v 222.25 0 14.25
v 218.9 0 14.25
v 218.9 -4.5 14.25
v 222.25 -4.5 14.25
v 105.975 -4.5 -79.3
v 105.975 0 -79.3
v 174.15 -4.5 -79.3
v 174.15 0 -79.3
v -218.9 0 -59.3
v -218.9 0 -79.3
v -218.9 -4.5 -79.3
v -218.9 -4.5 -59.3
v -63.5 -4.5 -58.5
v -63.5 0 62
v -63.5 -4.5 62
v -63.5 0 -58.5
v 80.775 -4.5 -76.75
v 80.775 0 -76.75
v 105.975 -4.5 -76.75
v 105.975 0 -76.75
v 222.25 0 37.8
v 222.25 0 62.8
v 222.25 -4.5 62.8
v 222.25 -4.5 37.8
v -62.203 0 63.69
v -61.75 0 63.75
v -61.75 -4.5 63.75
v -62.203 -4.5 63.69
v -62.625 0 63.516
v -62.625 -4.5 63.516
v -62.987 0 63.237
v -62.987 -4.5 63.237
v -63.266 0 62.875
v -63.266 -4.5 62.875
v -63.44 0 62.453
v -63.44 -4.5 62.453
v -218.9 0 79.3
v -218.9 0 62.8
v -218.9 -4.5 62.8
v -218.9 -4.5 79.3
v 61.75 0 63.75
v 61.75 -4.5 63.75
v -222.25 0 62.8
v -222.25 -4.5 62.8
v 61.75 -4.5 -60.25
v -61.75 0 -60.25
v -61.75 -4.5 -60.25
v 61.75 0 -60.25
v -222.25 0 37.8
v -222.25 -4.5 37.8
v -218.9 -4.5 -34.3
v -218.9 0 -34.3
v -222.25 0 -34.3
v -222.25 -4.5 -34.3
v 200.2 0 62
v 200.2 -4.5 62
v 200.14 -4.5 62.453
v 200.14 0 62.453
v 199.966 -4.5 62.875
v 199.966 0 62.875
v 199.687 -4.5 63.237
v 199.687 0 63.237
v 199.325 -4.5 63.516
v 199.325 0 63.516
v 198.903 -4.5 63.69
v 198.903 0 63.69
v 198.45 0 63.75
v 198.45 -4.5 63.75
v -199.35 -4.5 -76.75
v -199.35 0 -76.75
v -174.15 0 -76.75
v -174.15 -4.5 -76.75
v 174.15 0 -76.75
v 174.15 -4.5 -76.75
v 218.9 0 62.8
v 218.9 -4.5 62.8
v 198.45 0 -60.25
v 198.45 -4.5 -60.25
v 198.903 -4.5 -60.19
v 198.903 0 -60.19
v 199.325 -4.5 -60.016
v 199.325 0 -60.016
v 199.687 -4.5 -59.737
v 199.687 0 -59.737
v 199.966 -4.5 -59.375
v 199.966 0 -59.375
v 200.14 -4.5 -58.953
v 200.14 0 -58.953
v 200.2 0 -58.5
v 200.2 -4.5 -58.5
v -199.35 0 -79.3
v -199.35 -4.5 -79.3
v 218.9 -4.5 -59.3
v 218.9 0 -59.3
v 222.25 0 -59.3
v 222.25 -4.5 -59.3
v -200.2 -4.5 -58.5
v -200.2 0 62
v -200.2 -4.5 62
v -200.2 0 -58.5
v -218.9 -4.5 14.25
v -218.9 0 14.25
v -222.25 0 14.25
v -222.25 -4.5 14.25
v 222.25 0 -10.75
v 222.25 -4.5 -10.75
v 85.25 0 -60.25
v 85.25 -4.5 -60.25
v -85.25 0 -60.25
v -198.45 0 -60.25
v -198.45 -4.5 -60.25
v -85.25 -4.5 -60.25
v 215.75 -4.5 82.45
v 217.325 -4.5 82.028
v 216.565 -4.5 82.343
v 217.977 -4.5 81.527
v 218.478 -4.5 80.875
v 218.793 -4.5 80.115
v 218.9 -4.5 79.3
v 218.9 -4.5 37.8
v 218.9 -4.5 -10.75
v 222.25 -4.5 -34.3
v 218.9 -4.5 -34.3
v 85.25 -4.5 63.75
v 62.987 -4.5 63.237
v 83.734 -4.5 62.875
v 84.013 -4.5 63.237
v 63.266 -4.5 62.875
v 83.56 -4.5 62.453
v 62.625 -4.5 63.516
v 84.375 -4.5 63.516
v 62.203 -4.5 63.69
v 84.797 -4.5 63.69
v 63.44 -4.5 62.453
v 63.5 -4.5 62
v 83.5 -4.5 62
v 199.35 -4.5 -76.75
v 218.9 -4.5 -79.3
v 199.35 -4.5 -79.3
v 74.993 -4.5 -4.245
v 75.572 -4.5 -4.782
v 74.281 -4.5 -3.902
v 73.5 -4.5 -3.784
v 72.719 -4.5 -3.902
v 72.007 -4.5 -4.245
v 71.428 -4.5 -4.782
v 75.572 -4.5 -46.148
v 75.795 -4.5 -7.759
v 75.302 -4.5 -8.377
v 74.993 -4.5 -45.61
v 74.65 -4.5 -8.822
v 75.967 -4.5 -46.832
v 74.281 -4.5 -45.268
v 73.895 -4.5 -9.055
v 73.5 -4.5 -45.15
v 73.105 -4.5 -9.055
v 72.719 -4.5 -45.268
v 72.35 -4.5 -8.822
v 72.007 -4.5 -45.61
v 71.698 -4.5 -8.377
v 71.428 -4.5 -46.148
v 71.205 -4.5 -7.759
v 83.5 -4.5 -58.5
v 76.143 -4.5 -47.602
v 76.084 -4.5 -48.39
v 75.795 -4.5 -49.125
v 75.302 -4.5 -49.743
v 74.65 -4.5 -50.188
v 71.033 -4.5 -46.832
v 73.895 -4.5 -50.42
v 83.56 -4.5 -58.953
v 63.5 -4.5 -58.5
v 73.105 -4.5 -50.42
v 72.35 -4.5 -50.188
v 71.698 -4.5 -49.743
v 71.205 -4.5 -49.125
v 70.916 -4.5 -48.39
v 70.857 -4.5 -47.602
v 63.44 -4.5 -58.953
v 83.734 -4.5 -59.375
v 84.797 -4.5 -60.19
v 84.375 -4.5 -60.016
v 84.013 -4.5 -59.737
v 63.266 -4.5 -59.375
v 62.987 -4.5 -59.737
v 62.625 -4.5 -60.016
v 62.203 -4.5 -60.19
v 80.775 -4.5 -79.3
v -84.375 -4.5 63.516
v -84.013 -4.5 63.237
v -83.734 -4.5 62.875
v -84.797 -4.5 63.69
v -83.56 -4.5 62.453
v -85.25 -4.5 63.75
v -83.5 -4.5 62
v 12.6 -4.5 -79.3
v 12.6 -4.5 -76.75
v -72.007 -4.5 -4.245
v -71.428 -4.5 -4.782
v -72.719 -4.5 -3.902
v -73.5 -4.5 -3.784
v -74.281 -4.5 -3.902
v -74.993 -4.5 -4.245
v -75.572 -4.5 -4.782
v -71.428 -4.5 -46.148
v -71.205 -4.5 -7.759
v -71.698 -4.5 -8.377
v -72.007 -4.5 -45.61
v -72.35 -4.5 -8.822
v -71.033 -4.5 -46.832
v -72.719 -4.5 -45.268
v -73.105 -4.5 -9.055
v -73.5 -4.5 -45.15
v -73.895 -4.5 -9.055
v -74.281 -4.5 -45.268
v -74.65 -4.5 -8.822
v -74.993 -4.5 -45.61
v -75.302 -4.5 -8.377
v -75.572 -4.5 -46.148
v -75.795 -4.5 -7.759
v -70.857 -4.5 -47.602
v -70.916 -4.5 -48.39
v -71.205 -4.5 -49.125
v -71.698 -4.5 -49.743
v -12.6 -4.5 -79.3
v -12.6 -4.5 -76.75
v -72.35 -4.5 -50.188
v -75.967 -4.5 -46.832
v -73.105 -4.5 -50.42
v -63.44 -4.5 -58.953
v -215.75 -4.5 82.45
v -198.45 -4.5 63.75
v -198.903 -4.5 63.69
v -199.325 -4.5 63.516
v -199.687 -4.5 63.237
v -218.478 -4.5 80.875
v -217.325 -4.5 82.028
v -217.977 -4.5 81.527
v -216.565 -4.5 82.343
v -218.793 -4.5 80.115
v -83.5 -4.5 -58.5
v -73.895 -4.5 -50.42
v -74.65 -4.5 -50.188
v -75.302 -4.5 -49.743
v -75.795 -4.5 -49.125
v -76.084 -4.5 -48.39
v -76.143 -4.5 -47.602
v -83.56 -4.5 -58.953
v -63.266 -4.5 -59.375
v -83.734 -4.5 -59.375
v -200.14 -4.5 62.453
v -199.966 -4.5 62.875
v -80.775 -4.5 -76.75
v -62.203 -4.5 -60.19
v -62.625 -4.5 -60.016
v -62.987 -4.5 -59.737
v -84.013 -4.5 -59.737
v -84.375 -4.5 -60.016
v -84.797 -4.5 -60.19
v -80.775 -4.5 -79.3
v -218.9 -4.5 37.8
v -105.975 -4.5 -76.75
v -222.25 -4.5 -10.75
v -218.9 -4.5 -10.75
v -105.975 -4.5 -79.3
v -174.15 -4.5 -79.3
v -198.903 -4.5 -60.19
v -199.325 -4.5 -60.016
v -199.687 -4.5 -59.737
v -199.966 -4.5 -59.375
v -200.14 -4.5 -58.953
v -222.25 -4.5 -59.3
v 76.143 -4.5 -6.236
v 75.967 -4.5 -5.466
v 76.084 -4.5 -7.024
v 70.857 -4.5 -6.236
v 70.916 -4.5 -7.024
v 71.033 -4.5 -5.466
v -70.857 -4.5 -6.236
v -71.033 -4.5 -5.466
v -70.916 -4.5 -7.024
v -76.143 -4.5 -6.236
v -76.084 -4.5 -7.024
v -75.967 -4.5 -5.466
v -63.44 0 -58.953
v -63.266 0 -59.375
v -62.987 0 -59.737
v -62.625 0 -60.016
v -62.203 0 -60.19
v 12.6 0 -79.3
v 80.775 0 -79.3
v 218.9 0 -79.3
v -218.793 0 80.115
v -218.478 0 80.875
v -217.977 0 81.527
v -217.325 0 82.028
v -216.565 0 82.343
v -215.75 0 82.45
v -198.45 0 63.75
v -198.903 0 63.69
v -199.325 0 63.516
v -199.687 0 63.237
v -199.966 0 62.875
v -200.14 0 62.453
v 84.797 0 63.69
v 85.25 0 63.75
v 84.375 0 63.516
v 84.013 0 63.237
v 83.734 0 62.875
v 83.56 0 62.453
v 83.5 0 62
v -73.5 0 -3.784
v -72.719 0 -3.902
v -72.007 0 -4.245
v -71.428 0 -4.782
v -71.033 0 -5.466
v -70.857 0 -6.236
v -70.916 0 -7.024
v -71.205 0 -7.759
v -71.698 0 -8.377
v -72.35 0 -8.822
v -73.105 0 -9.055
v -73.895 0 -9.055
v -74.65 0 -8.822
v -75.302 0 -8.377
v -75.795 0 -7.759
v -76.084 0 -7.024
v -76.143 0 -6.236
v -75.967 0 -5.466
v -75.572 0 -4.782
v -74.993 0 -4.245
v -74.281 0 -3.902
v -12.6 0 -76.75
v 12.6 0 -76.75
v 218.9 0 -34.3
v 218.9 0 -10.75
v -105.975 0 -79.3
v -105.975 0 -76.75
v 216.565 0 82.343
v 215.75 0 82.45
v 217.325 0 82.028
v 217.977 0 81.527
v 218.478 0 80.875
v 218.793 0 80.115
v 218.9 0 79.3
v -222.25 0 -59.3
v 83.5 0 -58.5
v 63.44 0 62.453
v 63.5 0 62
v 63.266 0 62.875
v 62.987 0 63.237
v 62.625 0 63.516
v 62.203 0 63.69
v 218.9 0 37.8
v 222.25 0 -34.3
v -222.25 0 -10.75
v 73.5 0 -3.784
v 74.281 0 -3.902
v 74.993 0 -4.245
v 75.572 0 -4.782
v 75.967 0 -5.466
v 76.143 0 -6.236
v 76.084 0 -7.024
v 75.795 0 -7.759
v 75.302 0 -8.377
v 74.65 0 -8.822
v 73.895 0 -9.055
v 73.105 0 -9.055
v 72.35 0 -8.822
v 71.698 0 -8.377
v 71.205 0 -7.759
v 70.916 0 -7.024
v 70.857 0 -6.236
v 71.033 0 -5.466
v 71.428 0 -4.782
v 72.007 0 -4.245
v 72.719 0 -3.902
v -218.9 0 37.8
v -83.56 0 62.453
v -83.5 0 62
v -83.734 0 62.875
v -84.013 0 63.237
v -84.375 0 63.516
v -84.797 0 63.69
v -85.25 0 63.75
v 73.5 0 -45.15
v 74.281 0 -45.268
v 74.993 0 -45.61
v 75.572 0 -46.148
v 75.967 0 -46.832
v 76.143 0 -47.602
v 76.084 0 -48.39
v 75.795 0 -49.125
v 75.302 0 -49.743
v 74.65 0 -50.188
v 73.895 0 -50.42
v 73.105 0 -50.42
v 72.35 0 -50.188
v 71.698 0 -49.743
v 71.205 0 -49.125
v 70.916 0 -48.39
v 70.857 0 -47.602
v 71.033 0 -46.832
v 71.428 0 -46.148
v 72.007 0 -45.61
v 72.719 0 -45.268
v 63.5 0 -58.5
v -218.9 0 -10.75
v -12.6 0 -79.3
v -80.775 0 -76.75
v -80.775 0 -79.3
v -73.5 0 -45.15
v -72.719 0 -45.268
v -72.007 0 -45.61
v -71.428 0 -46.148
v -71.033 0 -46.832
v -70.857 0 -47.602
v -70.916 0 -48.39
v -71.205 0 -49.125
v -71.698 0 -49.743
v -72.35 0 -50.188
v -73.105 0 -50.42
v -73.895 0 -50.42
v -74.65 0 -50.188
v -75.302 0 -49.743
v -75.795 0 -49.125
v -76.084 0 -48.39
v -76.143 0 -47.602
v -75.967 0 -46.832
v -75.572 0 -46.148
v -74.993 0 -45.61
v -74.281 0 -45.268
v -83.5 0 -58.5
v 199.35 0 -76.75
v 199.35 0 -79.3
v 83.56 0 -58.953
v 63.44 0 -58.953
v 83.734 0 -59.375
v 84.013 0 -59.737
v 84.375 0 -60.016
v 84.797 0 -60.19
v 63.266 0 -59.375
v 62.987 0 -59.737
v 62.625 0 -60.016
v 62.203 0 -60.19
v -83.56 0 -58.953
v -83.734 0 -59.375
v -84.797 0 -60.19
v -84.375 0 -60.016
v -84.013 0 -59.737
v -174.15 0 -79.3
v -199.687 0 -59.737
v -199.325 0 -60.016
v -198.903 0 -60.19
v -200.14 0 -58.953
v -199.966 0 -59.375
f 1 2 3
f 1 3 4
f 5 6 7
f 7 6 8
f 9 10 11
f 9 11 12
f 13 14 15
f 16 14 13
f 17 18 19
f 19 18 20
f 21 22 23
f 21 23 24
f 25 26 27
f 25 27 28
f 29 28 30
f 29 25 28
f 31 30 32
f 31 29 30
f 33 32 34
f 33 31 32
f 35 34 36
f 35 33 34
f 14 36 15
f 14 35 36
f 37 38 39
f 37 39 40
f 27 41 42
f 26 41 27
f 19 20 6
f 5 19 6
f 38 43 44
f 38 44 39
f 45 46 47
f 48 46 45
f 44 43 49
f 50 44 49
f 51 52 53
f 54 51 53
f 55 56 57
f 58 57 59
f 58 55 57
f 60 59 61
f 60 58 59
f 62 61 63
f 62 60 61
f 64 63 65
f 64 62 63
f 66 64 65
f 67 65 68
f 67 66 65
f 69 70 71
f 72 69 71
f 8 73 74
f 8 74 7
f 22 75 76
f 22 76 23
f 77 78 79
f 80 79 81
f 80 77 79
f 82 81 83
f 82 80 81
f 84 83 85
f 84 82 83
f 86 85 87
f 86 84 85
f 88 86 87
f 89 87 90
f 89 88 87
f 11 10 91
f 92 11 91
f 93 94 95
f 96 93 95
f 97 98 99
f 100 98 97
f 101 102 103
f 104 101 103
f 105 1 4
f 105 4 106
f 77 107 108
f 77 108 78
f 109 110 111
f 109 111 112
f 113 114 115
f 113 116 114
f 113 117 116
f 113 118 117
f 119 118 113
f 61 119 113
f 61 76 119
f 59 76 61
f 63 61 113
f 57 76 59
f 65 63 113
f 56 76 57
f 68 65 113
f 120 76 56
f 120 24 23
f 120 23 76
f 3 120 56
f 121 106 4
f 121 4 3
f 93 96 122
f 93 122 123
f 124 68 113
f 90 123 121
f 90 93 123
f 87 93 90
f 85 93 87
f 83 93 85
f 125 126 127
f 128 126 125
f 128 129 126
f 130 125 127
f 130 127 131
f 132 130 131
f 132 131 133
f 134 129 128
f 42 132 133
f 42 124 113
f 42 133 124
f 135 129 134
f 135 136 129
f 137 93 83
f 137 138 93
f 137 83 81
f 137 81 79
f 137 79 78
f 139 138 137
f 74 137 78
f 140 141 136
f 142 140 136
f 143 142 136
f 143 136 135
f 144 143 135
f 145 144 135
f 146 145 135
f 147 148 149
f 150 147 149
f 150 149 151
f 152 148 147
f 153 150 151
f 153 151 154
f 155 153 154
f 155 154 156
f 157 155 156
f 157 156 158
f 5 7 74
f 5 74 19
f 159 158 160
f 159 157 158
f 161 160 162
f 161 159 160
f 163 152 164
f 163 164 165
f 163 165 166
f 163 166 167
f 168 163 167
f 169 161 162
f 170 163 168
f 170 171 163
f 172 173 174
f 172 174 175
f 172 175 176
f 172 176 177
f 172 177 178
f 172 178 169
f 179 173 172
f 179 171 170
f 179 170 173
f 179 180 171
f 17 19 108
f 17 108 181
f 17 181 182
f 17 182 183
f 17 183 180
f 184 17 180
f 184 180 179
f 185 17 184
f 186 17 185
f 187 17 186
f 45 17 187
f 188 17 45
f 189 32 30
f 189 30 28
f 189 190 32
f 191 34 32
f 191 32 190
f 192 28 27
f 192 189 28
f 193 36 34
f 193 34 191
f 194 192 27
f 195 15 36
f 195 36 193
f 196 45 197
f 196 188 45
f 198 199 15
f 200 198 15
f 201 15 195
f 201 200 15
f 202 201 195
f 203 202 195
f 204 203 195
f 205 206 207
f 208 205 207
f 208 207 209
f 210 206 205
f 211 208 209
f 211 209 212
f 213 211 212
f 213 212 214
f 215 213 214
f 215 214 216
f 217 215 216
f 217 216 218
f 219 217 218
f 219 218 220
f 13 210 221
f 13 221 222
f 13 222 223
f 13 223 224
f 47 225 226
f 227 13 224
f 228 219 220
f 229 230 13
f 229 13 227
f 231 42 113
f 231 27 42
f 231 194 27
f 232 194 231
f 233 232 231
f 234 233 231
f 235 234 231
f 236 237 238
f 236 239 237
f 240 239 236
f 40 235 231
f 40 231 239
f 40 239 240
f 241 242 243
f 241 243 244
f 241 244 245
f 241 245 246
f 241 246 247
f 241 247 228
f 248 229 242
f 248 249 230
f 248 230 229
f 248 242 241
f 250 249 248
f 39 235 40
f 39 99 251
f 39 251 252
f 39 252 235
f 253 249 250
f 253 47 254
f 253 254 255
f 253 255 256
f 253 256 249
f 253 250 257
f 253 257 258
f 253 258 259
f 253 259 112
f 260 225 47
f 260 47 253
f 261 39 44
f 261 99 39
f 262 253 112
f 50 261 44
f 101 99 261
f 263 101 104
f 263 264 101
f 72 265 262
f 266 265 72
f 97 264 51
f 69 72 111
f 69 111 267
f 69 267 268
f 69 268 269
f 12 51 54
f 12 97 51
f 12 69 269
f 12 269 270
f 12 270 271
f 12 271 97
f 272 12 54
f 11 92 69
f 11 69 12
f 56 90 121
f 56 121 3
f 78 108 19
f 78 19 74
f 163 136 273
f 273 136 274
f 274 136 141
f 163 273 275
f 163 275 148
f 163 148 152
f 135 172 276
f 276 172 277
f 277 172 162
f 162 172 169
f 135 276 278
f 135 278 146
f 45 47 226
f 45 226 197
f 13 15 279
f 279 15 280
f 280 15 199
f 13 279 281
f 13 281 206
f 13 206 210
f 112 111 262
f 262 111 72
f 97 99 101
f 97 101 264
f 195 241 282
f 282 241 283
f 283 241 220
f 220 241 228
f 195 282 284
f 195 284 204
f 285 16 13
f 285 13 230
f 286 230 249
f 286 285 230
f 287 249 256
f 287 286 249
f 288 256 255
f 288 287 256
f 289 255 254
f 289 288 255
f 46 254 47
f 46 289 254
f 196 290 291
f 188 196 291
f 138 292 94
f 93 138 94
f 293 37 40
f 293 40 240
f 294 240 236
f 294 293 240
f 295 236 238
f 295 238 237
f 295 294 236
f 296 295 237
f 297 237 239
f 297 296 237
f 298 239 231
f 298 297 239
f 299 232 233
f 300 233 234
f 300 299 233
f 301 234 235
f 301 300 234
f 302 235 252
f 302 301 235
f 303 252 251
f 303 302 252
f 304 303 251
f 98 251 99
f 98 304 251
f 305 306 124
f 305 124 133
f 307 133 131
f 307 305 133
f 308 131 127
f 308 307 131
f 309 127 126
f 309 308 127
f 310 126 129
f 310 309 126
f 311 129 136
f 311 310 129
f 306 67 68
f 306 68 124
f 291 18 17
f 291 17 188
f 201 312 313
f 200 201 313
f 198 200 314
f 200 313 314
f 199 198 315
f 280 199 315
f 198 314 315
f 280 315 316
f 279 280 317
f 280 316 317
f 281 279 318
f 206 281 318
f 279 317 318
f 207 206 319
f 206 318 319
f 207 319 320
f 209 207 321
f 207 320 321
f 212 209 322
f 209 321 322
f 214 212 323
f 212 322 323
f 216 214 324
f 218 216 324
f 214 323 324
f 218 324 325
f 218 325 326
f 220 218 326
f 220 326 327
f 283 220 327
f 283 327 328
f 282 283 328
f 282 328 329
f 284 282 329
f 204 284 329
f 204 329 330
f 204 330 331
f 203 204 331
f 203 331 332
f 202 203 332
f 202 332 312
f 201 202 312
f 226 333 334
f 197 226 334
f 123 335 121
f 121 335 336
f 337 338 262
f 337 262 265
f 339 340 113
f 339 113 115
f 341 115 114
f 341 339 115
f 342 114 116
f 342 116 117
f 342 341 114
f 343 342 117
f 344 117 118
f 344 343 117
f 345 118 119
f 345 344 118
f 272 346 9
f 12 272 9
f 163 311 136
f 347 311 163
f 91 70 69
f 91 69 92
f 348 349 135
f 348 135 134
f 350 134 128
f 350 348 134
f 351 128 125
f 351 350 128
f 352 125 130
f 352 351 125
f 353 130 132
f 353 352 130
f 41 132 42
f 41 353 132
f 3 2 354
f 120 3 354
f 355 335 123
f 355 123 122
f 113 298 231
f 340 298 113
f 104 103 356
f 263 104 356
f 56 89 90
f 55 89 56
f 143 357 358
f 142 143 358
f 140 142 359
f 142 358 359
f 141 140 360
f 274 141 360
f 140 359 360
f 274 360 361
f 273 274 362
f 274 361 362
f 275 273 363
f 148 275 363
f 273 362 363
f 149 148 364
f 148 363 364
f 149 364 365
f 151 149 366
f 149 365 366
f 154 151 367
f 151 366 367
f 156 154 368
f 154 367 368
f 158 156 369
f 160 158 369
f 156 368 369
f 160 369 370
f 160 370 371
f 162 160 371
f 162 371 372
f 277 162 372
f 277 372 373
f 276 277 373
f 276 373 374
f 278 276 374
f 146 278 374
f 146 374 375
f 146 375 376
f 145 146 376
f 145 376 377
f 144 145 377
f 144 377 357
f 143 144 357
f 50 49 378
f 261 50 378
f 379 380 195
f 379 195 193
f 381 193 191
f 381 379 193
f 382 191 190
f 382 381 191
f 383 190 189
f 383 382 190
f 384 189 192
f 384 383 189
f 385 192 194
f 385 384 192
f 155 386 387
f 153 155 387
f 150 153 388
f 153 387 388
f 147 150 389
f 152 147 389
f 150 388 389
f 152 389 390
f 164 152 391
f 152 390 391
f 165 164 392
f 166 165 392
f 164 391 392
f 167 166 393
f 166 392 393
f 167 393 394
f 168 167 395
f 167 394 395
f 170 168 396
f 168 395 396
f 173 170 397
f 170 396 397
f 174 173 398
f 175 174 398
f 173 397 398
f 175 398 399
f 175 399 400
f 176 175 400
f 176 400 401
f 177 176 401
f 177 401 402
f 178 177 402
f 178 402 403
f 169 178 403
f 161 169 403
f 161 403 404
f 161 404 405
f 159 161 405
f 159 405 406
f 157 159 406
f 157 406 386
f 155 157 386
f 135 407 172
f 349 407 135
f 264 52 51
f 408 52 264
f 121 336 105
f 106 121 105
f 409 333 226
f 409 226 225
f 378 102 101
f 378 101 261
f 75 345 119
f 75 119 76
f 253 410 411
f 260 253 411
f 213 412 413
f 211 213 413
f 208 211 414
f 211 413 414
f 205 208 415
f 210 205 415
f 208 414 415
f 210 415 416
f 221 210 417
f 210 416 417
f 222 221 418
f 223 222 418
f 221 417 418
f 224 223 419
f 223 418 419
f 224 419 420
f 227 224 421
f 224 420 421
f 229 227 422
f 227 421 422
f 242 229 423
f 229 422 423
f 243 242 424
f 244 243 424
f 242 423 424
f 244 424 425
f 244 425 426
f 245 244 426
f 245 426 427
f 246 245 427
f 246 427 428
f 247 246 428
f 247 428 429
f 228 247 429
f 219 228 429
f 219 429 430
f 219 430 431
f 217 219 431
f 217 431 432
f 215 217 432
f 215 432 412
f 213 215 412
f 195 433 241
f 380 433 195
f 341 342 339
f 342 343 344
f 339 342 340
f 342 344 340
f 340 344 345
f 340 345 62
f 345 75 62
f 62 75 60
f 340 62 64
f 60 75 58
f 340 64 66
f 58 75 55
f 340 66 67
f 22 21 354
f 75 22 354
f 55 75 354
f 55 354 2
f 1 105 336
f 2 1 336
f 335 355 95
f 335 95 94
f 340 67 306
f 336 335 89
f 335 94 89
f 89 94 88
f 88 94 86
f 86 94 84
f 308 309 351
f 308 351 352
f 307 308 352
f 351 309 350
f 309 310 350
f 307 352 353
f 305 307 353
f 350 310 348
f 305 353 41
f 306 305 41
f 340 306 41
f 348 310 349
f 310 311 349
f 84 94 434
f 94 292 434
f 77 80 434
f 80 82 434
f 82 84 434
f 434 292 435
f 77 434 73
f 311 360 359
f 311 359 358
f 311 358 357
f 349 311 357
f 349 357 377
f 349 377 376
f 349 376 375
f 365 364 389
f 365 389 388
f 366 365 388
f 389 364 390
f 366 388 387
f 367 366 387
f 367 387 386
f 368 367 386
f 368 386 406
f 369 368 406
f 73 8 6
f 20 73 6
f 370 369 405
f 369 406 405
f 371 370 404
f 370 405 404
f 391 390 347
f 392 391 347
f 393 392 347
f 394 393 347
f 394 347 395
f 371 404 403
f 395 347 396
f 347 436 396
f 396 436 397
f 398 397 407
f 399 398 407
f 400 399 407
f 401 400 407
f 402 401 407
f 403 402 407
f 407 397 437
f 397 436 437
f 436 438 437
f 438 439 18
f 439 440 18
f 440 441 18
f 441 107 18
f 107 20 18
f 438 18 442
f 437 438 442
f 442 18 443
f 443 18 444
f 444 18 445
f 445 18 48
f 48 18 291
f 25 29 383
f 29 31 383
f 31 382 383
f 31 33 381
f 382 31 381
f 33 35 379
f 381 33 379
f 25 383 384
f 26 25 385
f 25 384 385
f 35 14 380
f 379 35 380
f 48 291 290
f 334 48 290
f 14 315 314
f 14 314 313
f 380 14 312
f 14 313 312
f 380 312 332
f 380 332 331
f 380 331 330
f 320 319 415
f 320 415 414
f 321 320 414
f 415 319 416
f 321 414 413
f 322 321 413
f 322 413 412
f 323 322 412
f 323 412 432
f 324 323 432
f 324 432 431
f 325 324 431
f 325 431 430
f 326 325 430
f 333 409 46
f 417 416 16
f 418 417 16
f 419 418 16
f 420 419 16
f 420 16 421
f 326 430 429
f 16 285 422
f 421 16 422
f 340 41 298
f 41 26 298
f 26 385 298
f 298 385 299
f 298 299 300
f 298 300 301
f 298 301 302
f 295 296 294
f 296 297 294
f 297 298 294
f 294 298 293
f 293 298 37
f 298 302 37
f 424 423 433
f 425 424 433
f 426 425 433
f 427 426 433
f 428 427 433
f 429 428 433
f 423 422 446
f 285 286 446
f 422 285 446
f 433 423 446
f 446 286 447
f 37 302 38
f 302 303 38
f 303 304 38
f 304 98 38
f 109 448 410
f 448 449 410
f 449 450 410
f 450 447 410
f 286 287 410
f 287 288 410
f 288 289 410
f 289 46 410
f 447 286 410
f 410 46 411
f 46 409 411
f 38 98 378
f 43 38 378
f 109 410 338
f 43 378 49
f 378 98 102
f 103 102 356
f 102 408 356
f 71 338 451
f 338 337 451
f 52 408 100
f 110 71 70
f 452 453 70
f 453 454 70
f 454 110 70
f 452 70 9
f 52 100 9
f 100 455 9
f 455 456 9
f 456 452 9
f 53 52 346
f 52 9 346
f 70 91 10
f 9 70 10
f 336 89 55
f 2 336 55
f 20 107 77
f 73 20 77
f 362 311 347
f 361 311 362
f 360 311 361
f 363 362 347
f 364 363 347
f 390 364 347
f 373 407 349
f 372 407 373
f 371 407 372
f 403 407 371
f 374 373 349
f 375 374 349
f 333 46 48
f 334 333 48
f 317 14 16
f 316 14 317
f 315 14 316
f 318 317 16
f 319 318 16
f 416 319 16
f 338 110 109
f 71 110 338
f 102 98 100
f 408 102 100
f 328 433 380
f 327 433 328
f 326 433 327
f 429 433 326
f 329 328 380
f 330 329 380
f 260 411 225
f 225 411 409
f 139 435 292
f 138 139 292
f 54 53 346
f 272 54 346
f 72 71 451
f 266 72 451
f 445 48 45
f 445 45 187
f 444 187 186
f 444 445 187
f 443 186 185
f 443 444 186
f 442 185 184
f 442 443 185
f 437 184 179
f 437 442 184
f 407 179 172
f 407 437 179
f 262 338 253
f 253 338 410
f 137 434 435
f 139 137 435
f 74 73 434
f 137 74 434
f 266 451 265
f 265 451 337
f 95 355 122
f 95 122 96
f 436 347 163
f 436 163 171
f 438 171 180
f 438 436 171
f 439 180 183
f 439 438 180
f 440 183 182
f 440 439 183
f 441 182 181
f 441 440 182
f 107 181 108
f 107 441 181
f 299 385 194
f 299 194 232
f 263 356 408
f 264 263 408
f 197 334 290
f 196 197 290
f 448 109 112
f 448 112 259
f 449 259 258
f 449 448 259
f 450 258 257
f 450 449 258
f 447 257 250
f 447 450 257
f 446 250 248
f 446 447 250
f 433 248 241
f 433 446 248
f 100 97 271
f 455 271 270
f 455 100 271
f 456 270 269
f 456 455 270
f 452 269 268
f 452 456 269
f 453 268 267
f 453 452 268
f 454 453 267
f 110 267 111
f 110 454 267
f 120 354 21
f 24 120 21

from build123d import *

# Parameters (mm, degrees)
BASE_FLANGE1_DEPTH  = 4.5
CUT_EXTRUDE1_DEPTH  = 235.407023146
SKETCH7_W           = 25.2
SKETCH7_H           = 2.55
CUT_EXTRUDE2_DEPTH  = 10
SKETCH8_W           = 3
SKETCH8_H           = 25
BOSS_EXTRUDE1_DEPTH = 4.5
CUT_EXTRUDE3_START  = -4.55
SKETCH10_W          = 0.35
SKETCH10_H          = 23.55
SKETCH10_H_2        = 20
CUT_EXTRUDE3_DEPTH  = 4.55
SKETCH11_R          = 2.65
CUT_EXTRUDE4_DEPTH  = 238.093473128


# Sheet-metal steps are written as plain solids
with BuildPart() as part:
    # Sketch1 → Base-Flange1 (new body)
    with BuildSketch(Plane(origin=(0, 0, 0), x_dir=(1, 0, 0), z_dir=(0, 1, 0))):
        with BuildLine():
            Line((-219.25, 79.3), (219.25, 79.3))
            Line((219.25, 79.3), (219.25, -79.3))
            ThreePointArc((219.25, -79.3), (218.224873734, -81.774873734), (215.75, -82.8))
            Line((215.75, -82.8), (-215.75, -82.8))
            ThreePointArc((-215.75, -82.8), (-218.224873734, -81.774873734), (-219.25, -79.3))
            Line((-219.25, -79.3), (-219.25, 79.3))
        make_face()
    extrude(amount=-BASE_FLANGE1_DEPTH)

    # Sketch6 → Cut-Extrude1 (cut, through all)
    with BuildSketch(Plane(origin=(0, 0, 0), x_dir=(1, 0, 0), z_dir=(0, 1, 0))):
        with BuildLine():
            Line((-198.45, 60.25), (-85.25, 60.25))
            ThreePointArc((-85.25, 60.25), (-84.012563133, 59.737436867), (-83.5, 58.5))
            Line((-83.5, 58.5), (-83.5, -62))
            ThreePointArc((-83.5, -62), (-84.012563133, -63.237436867), (-85.25, -63.75))
            Line((-85.25, -63.75), (-198.45, -63.75))
            ThreePointArc((-198.45, -63.75), (-199.687436867, -63.237436867), (-200.2, -62))
            Line((-200.2, -62), (-200.2, 58.5))
            ThreePointArc((-200.2, 58.5), (-199.687436867, 59.737436867), (-198.45, 60.25))
        make_face()
        with BuildLine():
            Line((200.2, 58.5), (200.2, -62))
            ThreePointArc((200.2, -62), (199.687436867, -63.237436867), (198.45, -63.75))
            Line((198.45, -63.75), (85.25, -63.75))
            ThreePointArc((85.25, -63.75), (84.012563133, -63.237436867), (83.5, -62))
            Line((83.5, -62), (83.5, 58.5))
            ThreePointArc((83.5, 58.5), (84.012563133, 59.737436867), (85.25, 60.25))
            Line((85.25, 60.25), (198.45, 60.25))
            ThreePointArc((198.45, 60.25), (199.687436867, 59.737436867), (200.2, 58.5))
        make_face()
        with BuildLine():
            Line((63.5, 58.5), (63.5, -62))
            ThreePointArc((63.5, -62), (62.987436867, -63.237436867), (61.75, -63.75))
            Line((61.75, -63.75), (-61.75, -63.75))
            ThreePointArc((-61.75, -63.75), (-62.987436867, -63.237436867), (-63.5, -62))
            Line((-63.5, -62), (-63.5, 58.5))
            ThreePointArc((-63.5, 58.5), (-62.987436867, 59.737436867), (-61.75, 60.25))
            Line((-61.75, 60.25), (61.75, 60.25))
            ThreePointArc((61.75, 60.25), (62.987436867, 59.737436867), (63.5, 58.5))
        make_face()
    extrude(amount=-CUT_EXTRUDE1_DEPTH, mode=Mode.SUBTRACT)

    # Sketch7 → Cut-Extrude2 (cut)
    with BuildSketch(Plane(origin=(0, 0, 0), x_dir=(1, 0, 0), z_dir=(0, 1, 0))):
        with Locations((-186.75, 78.025)):
            Rectangle(SKETCH7_W, SKETCH7_H)
        with Locations((-93.375, 78.025)):
            Rectangle(SKETCH7_W, SKETCH7_H)
        with Locations((0, 78.025)):
            Rectangle(SKETCH7_W, SKETCH7_H)
        with Locations((93.375, 78.025)):
            Rectangle(SKETCH7_W, SKETCH7_H)
        with Locations((186.75, 78.025)):
            Rectangle(SKETCH7_W, SKETCH7_H)
    extrude(amount=-CUT_EXTRUDE2_DEPTH, mode=Mode.SUBTRACT)

    # Sketch8 → Boss-Extrude1 (add)
    with BuildSketch(Plane(origin=(0, 0, 0), x_dir=(1, 0, 0), z_dir=(0, 1, 0))):
        with Locations((220.75, -1.75)):
            Rectangle(SKETCH8_W, SKETCH8_H)
        with Locations((220.75, 46.8)):
            Rectangle(SKETCH8_W, SKETCH8_H)
        with Locations((220.75, -50.3)):
            Rectangle(SKETCH8_W, SKETCH8_H)
    boss_extrude1 = extrude(amount=-BOSS_EXTRUDE1_DEPTH)

    # Mirror1: Boss-Extrude1 across plane
    add(boss_extrude1.mirror(Plane(origin=(0, 0, 0), x_dir=(0, 0, 1), z_dir=(1, 0, 0))))

    # Sketch10 → Cut-Extrude3 (cut)
    with BuildSketch(Plane.XZ.offset(4.5).offset(CUT_EXTRUDE3_START)):
        with Locations((-219.075, 26.025)):
            Rectangle(SKETCH10_W, SKETCH10_H)
        with Locations((-219.075, -22.525)):
            Rectangle(SKETCH10_W, SKETCH10_H)
        with Locations((-219.075, -69.3)):
            Rectangle(SKETCH10_W, SKETCH10_H_2)
        with BuildLine():
            Line((218.9, 79.3), (218.9, 62.8))
            Line((218.9, 62.8), (219.25, 62.8))
            Line((219.25, 62.8), (219.25, 79.3))
            ThreePointArc((219.25, 79.3), (218.224873734, 81.774873734), (215.75, 82.8))
            Line((215.75, 82.8), (-215.75, 82.8))
            ThreePointArc((-215.75, 82.8), (-218.224873734, 81.774873734), (-219.25, 79.3))
            Line((-219.25, 79.3), (-219.25, 62.8))
            Line((-219.25, 62.8), (-218.9, 62.8))
            Line((-218.9, 62.8), (-218.9, 79.3))
            ThreePointArc((-218.9, 79.3), (-217.977386361, 81.527386361), (-215.75, 82.45))
            Line((-215.75, 82.45), (215.75, 82.45))
            ThreePointArc((215.75, 82.45), (217.977386361, 81.527386361), (218.9, 79.3))
        make_face()
        with Locations((219.075, 26.025)):
            Rectangle(SKETCH10_W, SKETCH10_H)
        with Locations((219.075, -22.525)):
            Rectangle(SKETCH10_W, SKETCH10_H)
        with Locations((219.075, -69.3)):
            Rectangle(SKETCH10_W, SKETCH10_H_2)
    extrude(amount=CUT_EXTRUDE3_DEPTH, mode=Mode.SUBTRACT)

    # Sketch11 → Cut-Extrude4 (cut, through all)
    with BuildSketch(Plane(origin=(0, 0, 0), x_dir=(1, 0, 0), z_dir=(0, 1, 0))):
        with Locations(Location((73.5, 47.8, 0), (0, 0, 270))):
            Circle(SKETCH11_R)
        with Locations(Location((73.5, 6.434271247, 0), (0, 0, 270))):
            Circle(SKETCH11_R)
        with Locations(Location((-73.5, 6.434271247, 0), (0, 0, 270))):
            Circle(SKETCH11_R)
        with Locations(Location((-73.5, 47.8, 0), (0, 0, 270))):
            Circle(SKETCH11_R)
    extrude(amount=-CUT_EXTRUDE4_DEPTH, mode=Mode.SUBTRACT)


solid = part.part
